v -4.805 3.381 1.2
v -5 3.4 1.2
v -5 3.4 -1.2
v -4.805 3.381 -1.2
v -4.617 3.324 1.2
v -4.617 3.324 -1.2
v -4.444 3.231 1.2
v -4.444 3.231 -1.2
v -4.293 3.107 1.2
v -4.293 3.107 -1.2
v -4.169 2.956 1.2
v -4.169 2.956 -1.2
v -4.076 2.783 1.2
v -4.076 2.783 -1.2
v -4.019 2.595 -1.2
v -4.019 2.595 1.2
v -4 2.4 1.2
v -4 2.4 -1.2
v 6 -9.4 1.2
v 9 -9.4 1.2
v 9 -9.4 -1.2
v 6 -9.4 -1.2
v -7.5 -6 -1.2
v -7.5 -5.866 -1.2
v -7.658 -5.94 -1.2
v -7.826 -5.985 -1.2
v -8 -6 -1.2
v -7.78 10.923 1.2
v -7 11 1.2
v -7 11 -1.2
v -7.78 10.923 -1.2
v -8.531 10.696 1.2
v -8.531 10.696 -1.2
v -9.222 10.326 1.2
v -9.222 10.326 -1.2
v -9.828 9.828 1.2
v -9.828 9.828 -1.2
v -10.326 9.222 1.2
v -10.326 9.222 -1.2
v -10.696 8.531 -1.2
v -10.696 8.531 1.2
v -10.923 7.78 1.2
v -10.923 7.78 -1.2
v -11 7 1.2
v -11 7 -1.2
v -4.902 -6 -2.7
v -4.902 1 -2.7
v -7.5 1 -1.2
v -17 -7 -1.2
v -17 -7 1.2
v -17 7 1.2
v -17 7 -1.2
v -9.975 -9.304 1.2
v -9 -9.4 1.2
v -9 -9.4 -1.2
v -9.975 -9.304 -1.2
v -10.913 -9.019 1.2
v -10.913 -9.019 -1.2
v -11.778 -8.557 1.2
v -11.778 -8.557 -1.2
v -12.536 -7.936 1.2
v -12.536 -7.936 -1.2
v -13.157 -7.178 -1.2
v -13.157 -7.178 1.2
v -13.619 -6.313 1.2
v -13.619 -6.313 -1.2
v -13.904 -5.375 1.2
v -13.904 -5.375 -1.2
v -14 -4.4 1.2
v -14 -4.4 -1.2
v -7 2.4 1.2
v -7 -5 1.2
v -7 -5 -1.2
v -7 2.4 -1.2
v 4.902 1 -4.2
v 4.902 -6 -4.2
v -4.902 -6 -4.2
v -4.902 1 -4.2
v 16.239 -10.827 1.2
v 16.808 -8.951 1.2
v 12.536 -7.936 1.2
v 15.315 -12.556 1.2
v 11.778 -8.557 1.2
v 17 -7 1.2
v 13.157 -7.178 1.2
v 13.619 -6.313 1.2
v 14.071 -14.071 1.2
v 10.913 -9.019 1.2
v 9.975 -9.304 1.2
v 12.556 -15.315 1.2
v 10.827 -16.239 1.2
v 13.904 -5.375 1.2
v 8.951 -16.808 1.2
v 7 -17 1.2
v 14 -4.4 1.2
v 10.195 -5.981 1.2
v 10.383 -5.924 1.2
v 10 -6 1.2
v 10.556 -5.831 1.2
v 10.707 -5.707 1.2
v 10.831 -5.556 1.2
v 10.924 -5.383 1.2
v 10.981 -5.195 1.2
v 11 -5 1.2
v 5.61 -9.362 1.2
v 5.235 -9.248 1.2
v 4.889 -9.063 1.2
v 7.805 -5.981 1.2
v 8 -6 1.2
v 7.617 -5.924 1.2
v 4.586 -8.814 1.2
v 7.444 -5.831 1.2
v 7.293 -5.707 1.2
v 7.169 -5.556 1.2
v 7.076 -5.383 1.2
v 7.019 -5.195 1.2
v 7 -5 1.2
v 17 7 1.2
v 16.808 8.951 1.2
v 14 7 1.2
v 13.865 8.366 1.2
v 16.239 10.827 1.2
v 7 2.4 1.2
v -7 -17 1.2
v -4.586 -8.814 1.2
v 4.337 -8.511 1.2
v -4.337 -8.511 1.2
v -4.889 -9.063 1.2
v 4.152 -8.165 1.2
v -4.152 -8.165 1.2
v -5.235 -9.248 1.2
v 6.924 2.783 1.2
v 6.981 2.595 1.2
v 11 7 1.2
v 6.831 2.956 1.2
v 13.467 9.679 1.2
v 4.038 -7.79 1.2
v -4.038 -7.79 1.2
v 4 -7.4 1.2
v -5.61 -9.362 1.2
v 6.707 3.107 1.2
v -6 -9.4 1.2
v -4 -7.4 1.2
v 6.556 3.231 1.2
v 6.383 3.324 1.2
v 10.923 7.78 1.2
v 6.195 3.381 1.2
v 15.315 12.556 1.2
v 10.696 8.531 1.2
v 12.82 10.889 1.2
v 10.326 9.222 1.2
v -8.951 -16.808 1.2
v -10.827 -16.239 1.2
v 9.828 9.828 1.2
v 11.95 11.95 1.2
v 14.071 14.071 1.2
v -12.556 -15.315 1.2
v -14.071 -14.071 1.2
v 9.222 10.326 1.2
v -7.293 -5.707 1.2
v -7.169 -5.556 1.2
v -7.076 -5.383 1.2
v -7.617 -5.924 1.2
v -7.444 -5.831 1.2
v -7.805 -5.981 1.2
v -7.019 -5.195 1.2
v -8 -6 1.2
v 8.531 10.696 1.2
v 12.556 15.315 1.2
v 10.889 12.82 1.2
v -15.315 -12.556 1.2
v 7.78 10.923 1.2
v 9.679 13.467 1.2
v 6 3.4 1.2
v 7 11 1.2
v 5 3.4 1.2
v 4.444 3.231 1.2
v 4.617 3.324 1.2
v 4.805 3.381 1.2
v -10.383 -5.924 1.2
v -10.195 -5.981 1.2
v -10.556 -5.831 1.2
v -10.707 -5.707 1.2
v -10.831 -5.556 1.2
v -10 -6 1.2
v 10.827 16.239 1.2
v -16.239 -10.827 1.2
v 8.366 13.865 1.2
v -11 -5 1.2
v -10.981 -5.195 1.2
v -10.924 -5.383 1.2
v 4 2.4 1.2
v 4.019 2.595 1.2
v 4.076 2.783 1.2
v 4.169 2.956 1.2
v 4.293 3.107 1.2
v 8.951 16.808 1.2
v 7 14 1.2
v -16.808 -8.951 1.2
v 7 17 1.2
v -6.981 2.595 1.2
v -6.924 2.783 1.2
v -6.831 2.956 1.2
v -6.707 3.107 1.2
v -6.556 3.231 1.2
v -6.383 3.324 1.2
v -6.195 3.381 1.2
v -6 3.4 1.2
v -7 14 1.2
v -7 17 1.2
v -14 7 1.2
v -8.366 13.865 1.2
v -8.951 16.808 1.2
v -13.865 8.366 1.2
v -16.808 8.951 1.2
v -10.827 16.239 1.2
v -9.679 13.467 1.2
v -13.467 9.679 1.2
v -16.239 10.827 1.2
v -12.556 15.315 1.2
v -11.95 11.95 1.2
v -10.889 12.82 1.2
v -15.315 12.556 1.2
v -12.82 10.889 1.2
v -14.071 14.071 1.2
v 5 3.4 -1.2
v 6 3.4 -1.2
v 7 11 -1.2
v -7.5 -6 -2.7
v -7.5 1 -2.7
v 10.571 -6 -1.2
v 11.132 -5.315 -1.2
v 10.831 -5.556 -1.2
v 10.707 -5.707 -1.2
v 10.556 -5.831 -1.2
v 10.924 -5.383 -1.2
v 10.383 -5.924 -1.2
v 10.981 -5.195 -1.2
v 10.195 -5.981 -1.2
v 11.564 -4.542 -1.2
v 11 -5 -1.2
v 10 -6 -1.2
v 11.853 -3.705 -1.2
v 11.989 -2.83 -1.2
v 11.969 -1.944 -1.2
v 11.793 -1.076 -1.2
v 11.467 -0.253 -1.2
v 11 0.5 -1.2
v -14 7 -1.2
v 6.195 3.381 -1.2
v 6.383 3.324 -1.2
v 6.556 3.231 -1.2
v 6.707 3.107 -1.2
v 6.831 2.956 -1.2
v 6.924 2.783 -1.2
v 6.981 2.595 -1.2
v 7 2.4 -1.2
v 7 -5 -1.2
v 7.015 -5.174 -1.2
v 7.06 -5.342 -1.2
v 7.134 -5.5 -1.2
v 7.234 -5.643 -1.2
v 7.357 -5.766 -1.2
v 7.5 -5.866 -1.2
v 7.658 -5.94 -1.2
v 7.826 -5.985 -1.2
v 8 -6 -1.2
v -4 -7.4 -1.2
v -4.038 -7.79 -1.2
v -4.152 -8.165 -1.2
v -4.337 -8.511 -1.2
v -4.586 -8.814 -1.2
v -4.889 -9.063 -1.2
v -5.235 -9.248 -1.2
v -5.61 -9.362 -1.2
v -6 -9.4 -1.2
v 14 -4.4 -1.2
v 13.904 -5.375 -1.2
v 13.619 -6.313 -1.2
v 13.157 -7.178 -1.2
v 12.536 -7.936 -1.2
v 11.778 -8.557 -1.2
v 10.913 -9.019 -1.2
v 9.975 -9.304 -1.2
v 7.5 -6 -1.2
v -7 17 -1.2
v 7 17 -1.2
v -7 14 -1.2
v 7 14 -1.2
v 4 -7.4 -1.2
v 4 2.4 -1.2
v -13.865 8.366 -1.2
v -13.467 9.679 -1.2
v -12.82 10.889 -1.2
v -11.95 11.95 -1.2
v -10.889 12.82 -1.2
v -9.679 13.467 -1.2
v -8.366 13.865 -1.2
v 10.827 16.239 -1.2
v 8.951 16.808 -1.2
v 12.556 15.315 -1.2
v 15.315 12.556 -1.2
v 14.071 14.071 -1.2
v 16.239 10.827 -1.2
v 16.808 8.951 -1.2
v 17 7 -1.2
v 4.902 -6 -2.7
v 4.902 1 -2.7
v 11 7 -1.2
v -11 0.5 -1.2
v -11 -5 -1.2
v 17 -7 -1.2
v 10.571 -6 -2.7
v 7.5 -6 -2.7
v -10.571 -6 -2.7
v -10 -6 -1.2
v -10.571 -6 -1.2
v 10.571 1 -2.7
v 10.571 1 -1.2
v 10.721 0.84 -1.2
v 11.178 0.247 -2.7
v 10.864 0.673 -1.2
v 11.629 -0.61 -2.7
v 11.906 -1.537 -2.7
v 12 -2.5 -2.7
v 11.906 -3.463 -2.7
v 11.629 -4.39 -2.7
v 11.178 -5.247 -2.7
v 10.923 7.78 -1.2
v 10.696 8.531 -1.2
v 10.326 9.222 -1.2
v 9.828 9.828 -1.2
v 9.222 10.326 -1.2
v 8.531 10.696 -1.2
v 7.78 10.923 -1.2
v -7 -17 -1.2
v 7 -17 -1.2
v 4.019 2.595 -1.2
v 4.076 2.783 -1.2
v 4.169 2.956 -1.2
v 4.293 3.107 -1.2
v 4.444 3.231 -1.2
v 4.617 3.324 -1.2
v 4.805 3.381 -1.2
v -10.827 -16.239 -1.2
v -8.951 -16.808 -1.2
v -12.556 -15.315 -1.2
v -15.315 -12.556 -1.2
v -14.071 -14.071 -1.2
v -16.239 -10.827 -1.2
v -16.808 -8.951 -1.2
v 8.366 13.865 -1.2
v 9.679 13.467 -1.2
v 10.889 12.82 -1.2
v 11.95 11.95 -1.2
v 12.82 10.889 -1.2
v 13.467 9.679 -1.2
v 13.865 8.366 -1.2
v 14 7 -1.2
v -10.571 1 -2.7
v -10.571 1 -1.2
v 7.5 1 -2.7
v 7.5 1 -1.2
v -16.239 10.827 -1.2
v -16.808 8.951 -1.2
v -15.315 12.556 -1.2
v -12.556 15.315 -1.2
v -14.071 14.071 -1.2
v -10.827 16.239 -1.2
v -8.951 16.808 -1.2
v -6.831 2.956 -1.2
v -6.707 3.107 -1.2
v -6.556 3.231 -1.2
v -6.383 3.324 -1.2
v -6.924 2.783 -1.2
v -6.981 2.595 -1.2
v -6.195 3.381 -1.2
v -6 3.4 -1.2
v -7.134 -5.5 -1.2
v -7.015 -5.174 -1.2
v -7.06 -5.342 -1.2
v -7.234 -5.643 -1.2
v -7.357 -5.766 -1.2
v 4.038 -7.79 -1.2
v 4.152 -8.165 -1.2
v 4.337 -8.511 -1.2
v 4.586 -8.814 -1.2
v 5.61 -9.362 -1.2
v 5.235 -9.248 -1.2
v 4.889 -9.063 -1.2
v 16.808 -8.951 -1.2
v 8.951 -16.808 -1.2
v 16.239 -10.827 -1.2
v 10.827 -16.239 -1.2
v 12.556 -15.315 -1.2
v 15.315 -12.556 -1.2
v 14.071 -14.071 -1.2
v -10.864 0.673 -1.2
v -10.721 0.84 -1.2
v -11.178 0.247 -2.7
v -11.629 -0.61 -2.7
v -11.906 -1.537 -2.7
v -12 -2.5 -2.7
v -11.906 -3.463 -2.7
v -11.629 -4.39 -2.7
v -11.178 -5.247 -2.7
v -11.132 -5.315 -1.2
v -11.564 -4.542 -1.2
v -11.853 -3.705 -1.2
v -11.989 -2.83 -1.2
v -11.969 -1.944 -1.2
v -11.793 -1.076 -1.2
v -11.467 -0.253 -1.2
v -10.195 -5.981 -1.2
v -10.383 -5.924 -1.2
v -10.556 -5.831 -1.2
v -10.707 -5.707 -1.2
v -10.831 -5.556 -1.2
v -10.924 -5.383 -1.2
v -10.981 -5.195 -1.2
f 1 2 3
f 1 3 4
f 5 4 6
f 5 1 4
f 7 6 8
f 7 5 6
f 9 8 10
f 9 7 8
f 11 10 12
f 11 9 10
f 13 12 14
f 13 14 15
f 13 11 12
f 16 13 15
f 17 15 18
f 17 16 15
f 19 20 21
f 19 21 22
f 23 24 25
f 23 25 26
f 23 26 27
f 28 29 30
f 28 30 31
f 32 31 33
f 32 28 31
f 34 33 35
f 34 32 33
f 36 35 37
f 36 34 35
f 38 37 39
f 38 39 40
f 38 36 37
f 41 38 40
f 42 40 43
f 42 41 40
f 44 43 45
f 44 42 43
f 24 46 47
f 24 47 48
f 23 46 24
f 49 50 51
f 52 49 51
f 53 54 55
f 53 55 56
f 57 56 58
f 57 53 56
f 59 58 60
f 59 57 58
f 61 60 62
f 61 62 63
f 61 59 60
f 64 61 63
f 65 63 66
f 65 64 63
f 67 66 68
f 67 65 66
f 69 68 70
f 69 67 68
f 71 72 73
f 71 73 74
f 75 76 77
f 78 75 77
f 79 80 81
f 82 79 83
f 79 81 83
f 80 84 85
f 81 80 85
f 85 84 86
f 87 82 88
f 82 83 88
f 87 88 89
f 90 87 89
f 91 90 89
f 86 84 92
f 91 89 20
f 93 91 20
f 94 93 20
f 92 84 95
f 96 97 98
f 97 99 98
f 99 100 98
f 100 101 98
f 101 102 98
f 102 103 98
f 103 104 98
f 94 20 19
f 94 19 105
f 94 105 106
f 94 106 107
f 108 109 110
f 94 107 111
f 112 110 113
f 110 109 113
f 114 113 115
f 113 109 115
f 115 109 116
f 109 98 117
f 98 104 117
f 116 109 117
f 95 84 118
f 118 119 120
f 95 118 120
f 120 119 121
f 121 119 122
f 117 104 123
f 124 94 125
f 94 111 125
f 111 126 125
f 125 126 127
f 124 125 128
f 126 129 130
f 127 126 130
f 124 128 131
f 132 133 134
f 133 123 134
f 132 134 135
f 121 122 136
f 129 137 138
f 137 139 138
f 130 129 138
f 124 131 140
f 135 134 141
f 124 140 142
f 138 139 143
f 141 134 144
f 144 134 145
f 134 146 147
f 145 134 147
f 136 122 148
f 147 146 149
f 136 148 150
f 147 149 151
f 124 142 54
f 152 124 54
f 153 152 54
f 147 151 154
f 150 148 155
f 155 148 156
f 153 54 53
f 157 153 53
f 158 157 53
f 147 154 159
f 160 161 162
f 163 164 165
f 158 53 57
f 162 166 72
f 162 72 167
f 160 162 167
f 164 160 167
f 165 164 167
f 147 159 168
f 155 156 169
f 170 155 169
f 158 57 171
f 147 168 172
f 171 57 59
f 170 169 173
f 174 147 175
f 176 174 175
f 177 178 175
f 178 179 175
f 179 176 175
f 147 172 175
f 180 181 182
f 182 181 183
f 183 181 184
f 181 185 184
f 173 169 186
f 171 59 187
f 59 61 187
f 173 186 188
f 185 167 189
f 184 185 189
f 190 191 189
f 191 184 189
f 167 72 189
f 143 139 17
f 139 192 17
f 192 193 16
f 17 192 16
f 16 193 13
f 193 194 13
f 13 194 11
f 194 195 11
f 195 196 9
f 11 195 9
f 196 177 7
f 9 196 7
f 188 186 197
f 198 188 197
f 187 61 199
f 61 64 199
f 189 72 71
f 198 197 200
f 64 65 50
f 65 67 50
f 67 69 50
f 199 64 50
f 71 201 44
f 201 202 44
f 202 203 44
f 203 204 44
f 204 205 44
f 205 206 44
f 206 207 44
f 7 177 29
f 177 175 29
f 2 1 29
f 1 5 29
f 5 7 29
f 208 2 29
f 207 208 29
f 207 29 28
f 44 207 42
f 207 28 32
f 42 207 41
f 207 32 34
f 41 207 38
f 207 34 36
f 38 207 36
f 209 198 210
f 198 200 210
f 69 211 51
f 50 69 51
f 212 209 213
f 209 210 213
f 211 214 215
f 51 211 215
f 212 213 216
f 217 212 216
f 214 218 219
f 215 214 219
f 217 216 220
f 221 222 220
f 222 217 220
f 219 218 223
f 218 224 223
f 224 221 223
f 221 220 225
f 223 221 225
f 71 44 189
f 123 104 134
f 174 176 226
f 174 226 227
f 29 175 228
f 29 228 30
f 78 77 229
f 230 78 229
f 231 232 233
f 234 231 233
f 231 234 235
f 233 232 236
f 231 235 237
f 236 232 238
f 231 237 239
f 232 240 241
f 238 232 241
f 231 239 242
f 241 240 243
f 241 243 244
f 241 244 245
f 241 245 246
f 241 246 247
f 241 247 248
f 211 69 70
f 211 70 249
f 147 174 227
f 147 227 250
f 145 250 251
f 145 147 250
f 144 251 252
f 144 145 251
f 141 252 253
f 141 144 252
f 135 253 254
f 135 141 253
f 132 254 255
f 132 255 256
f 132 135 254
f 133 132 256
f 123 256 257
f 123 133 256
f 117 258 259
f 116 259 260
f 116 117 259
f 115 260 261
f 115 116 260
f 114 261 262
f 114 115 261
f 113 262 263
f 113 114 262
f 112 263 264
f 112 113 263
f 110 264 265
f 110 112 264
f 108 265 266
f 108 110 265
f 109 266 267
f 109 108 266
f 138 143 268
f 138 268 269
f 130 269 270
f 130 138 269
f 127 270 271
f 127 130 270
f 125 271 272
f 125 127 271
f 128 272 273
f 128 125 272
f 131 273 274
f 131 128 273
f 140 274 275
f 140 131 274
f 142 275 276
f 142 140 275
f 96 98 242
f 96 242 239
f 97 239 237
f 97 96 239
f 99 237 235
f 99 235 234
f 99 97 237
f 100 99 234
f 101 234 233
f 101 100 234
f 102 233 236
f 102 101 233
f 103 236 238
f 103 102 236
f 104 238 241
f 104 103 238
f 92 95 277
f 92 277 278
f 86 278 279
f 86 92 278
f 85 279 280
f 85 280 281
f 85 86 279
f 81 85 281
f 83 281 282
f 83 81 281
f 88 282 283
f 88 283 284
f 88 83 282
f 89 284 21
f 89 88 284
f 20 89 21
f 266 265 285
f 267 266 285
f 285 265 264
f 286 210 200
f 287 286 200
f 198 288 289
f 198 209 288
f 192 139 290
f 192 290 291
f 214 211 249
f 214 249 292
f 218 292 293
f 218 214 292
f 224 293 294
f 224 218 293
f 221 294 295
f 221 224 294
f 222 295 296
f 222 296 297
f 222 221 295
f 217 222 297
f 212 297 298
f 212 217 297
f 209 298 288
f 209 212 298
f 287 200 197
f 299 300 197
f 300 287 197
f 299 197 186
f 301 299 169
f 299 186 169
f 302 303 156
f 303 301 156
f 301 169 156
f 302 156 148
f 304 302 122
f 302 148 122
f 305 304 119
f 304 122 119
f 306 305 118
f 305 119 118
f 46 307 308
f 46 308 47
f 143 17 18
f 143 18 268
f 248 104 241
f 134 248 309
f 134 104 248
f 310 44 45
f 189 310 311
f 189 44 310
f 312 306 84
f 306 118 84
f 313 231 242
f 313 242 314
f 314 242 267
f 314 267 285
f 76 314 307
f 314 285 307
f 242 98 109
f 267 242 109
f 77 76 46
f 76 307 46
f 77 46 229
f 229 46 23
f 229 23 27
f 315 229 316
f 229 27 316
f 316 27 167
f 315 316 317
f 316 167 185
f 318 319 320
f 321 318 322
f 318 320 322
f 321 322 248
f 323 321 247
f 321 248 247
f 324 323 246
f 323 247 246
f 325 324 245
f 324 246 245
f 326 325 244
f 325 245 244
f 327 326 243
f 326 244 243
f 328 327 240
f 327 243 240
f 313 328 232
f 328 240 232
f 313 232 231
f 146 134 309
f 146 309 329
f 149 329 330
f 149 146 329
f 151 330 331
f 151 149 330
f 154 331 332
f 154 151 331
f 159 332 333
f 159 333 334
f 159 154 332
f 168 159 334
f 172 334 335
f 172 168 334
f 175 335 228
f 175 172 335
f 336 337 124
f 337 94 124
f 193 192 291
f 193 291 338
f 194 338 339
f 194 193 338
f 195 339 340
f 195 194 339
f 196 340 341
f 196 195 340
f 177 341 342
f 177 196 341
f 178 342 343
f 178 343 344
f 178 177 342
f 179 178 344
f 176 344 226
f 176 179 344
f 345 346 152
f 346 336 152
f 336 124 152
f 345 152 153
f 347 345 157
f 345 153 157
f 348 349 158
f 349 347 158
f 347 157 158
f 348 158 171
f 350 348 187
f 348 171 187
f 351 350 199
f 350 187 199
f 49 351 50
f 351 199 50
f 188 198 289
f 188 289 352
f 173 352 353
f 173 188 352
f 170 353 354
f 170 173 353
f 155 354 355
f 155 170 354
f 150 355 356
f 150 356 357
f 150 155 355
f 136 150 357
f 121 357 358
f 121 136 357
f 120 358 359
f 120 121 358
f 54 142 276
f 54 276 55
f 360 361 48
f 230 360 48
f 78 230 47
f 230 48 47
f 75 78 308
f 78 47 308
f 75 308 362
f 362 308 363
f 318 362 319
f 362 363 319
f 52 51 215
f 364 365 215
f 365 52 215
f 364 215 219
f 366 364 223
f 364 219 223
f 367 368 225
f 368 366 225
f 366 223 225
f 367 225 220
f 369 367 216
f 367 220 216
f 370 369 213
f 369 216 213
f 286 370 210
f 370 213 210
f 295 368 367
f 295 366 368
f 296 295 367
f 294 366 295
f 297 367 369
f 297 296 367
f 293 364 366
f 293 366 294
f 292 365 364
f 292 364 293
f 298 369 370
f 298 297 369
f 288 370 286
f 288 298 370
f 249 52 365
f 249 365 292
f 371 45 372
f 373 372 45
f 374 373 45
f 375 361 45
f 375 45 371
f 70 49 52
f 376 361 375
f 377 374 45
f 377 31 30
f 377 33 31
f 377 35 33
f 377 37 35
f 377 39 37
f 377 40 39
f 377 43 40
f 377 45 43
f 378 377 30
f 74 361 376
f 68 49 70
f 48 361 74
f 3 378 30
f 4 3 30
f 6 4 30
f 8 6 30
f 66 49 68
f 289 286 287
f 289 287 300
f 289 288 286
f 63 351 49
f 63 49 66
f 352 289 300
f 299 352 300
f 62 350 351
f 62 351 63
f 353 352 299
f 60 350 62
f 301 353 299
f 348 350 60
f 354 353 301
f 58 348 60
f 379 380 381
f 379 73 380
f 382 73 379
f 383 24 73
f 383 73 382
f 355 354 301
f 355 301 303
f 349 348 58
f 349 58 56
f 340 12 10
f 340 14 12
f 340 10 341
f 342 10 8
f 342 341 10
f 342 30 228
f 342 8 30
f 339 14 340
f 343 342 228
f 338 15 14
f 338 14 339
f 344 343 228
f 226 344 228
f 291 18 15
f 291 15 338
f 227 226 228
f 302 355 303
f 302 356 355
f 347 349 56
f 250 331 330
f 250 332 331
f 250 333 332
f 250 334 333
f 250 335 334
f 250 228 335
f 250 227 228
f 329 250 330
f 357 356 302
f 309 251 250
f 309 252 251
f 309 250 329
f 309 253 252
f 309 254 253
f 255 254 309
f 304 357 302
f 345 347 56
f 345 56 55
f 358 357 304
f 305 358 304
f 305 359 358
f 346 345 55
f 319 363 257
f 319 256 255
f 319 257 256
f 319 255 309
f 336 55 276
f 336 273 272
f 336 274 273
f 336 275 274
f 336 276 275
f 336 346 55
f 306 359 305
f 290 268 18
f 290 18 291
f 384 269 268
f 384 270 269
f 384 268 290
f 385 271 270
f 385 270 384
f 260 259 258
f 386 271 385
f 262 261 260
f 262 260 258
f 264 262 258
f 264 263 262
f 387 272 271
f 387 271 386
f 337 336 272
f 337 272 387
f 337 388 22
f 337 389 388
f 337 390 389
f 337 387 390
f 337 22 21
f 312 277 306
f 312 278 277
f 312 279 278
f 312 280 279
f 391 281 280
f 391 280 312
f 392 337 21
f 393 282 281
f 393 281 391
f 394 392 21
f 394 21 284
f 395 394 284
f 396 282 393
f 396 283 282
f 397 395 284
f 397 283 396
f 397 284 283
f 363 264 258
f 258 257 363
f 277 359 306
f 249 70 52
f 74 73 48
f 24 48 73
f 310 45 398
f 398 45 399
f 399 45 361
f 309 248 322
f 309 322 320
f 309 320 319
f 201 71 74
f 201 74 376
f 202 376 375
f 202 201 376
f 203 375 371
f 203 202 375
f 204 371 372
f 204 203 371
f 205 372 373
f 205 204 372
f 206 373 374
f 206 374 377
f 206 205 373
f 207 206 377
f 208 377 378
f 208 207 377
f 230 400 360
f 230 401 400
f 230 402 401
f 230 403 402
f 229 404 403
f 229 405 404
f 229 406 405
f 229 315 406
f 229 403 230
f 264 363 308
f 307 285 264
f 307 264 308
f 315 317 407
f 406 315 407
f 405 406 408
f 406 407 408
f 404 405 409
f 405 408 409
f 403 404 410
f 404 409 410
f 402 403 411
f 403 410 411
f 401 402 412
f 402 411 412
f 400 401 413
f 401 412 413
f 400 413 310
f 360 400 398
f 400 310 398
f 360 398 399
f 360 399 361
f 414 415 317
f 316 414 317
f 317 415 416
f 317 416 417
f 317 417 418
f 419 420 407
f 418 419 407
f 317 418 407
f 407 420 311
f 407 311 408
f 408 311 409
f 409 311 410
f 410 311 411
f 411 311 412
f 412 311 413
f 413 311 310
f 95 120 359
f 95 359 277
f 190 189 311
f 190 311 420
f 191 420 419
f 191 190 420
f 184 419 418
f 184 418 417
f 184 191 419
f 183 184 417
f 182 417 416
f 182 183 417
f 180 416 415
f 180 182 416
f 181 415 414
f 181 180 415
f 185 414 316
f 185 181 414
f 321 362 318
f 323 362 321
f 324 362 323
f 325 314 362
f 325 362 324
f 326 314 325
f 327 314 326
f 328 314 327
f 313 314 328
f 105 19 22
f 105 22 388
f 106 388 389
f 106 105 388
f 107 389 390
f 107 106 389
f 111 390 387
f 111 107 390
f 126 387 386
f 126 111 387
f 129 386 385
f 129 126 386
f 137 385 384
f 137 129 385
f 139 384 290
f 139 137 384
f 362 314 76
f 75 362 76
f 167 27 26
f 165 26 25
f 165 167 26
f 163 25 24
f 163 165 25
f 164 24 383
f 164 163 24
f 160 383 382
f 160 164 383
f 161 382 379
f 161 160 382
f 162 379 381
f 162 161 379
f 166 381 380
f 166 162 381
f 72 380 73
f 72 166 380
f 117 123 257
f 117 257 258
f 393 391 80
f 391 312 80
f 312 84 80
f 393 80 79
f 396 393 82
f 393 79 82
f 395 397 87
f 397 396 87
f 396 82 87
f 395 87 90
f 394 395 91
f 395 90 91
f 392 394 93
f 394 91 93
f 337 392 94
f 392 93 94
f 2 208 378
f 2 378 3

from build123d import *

# Parameters (mm, degrees)
BOSS_EXTRUDE2_DEPTH     = 1.2
BOSS_EXTRUDE3_DEPTH     = 5
CUT_EXTRUDE1_DEPTH      = 25.828209762
CUT_EXTRUDE1_DEPTH_BACK = 25.828209762


with BuildPart() as part:
    # Sketch1 → Boss-Extrude2 (new, symmetric)
    with BuildSketch(Plane.XY):
        with BuildLine():
            ThreePointArc((7, 17), (14.071067812, 14.071067812), (17, 7))
            Line((17, 7), (17, -7))
            ThreePointArc((17, -7), (14.071067812, -14.071067812), (7, -17))
            Line((7, -17), (-7, -17))
            ThreePointArc((-7, -17), (-14.071067812, -14.071067812), (-17, -7))
            Line((-17, -7), (-17, 7))
            ThreePointArc((-17, 7), (-14.071067812, 14.071067812), (-7, 17))
            Line((-7, 17), (7, 17))
        make_face()
        with BuildLine():
            Line((-7, 14), (7, 14))
            ThreePointArc((7, 14), (11.949747468, 11.949747468), (14, 7))
            Line((14, 7), (14, -4.4))
            ThreePointArc((14, -4.4), (12.535533906, -7.935533906), (9, -9.4))
            Line((9, -9.4), (6, -9.4))
            ThreePointArc((6, -9.4), (4.585786438, -8.814213562), (4, -7.4))
            Line((4, -7.4), (4, 2.4))
            ThreePointArc((4, 2.4), (4.292893219, 3.107106781), (5, 3.4))
            Line((5, 3.4), (6, 3.4))
            ThreePointArc((6, 3.4), (6.707106781, 3.107106781), (7, 2.4))
            Line((7, 2.4), (7, -5))
            ThreePointArc((7, -5), (7.292893219, -5.707106781), (8, -6))
            Line((8, -6), (10, -6))
            ThreePointArc((10, -6), (10.707106781, -5.707106781), (11, -5))
            Line((11, -5), (11, 7))
            ThreePointArc((11, 7), (9.828427125, 9.828427125), (7, 11))
            Line((7, 11), (-7, 11))
            ThreePointArc((-7, 11), (-9.828427125, 9.828427125), (-11, 7))
            Line((-11, 7), (-11, -5))
            ThreePointArc((-11, -5), (-10.707106781, -5.707106781), (-10, -6))
            Line((-10, -6), (-8, -6))
            ThreePointArc((-8, -6), (-7.292893219, -5.707106781), (-7, -5))
            Line((-7, -5), (-7, 2.4))
            ThreePointArc((-7, 2.4), (-6.707106781, 3.107106781), (-6, 3.4))
            Line((-6, 3.4), (-5, 3.4))
            ThreePointArc((-5, 3.4), (-4.292893219, 3.107106781), (-4, 2.4))
            Line((-4, 2.4), (-4, -7.4))
            ThreePointArc((-4, -7.4), (-4.585786438, -8.814213562), (-6, -9.4))
            Line((-6, -9.4), (-9, -9.4))
            ThreePointArc((-9, -9.4), (-12.535533906, -7.935533906), (-14, -4.4))
            Line((-14, -4.4), (-14, 7))
            ThreePointArc((-14, 7), (-11.949747468, 11.949747468), (-7, 14))
        make_face(mode=Mode.SUBTRACT)
    extrude(amount=BOSS_EXTRUDE2_DEPTH, both=True)

    # Sketch2 → Boss-Extrude3 (add)
    with BuildSketch(Plane(origin=(0, 0, -1.2), x_dir=(-1, 0, 0), z_dir=(0, 0, -1))):
        with BuildLine():
            Line((-10.570714214, -6), (10.570714214, -6))
            ThreePointArc((10.570714214, -6), (12, -2.5), (10.570714214, 1))
            Line((10.570714214, 1), (-10.570714214, 1))
            ThreePointArc((-10.570714214, 1), (-12, -2.5), (-10.570714214, -6))
        make_face()
    extrude(amount=BOSS_EXTRUDE3_DEPTH)

    # Sketch3 → Cut-Extrude1 (cut, two sides: drawn at the far end of the back side and taken through both)
    with BuildSketch(Plane(origin=(0, 0, 0), x_dir=(1, 0, 0), z_dir=(0, 1, 0)).offset(-CUT_EXTRUDE1_DEPTH_BACK)):
        Polygon((-4.901923789, 4.2), (-7.5, 2.7), (-12, 2.7), (-15.905472788, 2.7), (-15.905472788, 4.2), (-15.905472788, 10.094032112), (14.61063782, 10.094032112), (14.61063782, 4.2), (14.61063782, 2.7), (12, 2.7), (7.5, 2.7), (4.901923789, 4.2), align=None)
        Polygon((4.901923789, 2.7), (-4.901923789, 2.7), (-7.5, 1.2), (7.5, 1.2), align=None)
    extrude(amount=CUT_EXTRUDE1_DEPTH + CUT_EXTRUDE1_DEPTH_BACK, mode=Mode.SUBTRACT)


solid = part.part
